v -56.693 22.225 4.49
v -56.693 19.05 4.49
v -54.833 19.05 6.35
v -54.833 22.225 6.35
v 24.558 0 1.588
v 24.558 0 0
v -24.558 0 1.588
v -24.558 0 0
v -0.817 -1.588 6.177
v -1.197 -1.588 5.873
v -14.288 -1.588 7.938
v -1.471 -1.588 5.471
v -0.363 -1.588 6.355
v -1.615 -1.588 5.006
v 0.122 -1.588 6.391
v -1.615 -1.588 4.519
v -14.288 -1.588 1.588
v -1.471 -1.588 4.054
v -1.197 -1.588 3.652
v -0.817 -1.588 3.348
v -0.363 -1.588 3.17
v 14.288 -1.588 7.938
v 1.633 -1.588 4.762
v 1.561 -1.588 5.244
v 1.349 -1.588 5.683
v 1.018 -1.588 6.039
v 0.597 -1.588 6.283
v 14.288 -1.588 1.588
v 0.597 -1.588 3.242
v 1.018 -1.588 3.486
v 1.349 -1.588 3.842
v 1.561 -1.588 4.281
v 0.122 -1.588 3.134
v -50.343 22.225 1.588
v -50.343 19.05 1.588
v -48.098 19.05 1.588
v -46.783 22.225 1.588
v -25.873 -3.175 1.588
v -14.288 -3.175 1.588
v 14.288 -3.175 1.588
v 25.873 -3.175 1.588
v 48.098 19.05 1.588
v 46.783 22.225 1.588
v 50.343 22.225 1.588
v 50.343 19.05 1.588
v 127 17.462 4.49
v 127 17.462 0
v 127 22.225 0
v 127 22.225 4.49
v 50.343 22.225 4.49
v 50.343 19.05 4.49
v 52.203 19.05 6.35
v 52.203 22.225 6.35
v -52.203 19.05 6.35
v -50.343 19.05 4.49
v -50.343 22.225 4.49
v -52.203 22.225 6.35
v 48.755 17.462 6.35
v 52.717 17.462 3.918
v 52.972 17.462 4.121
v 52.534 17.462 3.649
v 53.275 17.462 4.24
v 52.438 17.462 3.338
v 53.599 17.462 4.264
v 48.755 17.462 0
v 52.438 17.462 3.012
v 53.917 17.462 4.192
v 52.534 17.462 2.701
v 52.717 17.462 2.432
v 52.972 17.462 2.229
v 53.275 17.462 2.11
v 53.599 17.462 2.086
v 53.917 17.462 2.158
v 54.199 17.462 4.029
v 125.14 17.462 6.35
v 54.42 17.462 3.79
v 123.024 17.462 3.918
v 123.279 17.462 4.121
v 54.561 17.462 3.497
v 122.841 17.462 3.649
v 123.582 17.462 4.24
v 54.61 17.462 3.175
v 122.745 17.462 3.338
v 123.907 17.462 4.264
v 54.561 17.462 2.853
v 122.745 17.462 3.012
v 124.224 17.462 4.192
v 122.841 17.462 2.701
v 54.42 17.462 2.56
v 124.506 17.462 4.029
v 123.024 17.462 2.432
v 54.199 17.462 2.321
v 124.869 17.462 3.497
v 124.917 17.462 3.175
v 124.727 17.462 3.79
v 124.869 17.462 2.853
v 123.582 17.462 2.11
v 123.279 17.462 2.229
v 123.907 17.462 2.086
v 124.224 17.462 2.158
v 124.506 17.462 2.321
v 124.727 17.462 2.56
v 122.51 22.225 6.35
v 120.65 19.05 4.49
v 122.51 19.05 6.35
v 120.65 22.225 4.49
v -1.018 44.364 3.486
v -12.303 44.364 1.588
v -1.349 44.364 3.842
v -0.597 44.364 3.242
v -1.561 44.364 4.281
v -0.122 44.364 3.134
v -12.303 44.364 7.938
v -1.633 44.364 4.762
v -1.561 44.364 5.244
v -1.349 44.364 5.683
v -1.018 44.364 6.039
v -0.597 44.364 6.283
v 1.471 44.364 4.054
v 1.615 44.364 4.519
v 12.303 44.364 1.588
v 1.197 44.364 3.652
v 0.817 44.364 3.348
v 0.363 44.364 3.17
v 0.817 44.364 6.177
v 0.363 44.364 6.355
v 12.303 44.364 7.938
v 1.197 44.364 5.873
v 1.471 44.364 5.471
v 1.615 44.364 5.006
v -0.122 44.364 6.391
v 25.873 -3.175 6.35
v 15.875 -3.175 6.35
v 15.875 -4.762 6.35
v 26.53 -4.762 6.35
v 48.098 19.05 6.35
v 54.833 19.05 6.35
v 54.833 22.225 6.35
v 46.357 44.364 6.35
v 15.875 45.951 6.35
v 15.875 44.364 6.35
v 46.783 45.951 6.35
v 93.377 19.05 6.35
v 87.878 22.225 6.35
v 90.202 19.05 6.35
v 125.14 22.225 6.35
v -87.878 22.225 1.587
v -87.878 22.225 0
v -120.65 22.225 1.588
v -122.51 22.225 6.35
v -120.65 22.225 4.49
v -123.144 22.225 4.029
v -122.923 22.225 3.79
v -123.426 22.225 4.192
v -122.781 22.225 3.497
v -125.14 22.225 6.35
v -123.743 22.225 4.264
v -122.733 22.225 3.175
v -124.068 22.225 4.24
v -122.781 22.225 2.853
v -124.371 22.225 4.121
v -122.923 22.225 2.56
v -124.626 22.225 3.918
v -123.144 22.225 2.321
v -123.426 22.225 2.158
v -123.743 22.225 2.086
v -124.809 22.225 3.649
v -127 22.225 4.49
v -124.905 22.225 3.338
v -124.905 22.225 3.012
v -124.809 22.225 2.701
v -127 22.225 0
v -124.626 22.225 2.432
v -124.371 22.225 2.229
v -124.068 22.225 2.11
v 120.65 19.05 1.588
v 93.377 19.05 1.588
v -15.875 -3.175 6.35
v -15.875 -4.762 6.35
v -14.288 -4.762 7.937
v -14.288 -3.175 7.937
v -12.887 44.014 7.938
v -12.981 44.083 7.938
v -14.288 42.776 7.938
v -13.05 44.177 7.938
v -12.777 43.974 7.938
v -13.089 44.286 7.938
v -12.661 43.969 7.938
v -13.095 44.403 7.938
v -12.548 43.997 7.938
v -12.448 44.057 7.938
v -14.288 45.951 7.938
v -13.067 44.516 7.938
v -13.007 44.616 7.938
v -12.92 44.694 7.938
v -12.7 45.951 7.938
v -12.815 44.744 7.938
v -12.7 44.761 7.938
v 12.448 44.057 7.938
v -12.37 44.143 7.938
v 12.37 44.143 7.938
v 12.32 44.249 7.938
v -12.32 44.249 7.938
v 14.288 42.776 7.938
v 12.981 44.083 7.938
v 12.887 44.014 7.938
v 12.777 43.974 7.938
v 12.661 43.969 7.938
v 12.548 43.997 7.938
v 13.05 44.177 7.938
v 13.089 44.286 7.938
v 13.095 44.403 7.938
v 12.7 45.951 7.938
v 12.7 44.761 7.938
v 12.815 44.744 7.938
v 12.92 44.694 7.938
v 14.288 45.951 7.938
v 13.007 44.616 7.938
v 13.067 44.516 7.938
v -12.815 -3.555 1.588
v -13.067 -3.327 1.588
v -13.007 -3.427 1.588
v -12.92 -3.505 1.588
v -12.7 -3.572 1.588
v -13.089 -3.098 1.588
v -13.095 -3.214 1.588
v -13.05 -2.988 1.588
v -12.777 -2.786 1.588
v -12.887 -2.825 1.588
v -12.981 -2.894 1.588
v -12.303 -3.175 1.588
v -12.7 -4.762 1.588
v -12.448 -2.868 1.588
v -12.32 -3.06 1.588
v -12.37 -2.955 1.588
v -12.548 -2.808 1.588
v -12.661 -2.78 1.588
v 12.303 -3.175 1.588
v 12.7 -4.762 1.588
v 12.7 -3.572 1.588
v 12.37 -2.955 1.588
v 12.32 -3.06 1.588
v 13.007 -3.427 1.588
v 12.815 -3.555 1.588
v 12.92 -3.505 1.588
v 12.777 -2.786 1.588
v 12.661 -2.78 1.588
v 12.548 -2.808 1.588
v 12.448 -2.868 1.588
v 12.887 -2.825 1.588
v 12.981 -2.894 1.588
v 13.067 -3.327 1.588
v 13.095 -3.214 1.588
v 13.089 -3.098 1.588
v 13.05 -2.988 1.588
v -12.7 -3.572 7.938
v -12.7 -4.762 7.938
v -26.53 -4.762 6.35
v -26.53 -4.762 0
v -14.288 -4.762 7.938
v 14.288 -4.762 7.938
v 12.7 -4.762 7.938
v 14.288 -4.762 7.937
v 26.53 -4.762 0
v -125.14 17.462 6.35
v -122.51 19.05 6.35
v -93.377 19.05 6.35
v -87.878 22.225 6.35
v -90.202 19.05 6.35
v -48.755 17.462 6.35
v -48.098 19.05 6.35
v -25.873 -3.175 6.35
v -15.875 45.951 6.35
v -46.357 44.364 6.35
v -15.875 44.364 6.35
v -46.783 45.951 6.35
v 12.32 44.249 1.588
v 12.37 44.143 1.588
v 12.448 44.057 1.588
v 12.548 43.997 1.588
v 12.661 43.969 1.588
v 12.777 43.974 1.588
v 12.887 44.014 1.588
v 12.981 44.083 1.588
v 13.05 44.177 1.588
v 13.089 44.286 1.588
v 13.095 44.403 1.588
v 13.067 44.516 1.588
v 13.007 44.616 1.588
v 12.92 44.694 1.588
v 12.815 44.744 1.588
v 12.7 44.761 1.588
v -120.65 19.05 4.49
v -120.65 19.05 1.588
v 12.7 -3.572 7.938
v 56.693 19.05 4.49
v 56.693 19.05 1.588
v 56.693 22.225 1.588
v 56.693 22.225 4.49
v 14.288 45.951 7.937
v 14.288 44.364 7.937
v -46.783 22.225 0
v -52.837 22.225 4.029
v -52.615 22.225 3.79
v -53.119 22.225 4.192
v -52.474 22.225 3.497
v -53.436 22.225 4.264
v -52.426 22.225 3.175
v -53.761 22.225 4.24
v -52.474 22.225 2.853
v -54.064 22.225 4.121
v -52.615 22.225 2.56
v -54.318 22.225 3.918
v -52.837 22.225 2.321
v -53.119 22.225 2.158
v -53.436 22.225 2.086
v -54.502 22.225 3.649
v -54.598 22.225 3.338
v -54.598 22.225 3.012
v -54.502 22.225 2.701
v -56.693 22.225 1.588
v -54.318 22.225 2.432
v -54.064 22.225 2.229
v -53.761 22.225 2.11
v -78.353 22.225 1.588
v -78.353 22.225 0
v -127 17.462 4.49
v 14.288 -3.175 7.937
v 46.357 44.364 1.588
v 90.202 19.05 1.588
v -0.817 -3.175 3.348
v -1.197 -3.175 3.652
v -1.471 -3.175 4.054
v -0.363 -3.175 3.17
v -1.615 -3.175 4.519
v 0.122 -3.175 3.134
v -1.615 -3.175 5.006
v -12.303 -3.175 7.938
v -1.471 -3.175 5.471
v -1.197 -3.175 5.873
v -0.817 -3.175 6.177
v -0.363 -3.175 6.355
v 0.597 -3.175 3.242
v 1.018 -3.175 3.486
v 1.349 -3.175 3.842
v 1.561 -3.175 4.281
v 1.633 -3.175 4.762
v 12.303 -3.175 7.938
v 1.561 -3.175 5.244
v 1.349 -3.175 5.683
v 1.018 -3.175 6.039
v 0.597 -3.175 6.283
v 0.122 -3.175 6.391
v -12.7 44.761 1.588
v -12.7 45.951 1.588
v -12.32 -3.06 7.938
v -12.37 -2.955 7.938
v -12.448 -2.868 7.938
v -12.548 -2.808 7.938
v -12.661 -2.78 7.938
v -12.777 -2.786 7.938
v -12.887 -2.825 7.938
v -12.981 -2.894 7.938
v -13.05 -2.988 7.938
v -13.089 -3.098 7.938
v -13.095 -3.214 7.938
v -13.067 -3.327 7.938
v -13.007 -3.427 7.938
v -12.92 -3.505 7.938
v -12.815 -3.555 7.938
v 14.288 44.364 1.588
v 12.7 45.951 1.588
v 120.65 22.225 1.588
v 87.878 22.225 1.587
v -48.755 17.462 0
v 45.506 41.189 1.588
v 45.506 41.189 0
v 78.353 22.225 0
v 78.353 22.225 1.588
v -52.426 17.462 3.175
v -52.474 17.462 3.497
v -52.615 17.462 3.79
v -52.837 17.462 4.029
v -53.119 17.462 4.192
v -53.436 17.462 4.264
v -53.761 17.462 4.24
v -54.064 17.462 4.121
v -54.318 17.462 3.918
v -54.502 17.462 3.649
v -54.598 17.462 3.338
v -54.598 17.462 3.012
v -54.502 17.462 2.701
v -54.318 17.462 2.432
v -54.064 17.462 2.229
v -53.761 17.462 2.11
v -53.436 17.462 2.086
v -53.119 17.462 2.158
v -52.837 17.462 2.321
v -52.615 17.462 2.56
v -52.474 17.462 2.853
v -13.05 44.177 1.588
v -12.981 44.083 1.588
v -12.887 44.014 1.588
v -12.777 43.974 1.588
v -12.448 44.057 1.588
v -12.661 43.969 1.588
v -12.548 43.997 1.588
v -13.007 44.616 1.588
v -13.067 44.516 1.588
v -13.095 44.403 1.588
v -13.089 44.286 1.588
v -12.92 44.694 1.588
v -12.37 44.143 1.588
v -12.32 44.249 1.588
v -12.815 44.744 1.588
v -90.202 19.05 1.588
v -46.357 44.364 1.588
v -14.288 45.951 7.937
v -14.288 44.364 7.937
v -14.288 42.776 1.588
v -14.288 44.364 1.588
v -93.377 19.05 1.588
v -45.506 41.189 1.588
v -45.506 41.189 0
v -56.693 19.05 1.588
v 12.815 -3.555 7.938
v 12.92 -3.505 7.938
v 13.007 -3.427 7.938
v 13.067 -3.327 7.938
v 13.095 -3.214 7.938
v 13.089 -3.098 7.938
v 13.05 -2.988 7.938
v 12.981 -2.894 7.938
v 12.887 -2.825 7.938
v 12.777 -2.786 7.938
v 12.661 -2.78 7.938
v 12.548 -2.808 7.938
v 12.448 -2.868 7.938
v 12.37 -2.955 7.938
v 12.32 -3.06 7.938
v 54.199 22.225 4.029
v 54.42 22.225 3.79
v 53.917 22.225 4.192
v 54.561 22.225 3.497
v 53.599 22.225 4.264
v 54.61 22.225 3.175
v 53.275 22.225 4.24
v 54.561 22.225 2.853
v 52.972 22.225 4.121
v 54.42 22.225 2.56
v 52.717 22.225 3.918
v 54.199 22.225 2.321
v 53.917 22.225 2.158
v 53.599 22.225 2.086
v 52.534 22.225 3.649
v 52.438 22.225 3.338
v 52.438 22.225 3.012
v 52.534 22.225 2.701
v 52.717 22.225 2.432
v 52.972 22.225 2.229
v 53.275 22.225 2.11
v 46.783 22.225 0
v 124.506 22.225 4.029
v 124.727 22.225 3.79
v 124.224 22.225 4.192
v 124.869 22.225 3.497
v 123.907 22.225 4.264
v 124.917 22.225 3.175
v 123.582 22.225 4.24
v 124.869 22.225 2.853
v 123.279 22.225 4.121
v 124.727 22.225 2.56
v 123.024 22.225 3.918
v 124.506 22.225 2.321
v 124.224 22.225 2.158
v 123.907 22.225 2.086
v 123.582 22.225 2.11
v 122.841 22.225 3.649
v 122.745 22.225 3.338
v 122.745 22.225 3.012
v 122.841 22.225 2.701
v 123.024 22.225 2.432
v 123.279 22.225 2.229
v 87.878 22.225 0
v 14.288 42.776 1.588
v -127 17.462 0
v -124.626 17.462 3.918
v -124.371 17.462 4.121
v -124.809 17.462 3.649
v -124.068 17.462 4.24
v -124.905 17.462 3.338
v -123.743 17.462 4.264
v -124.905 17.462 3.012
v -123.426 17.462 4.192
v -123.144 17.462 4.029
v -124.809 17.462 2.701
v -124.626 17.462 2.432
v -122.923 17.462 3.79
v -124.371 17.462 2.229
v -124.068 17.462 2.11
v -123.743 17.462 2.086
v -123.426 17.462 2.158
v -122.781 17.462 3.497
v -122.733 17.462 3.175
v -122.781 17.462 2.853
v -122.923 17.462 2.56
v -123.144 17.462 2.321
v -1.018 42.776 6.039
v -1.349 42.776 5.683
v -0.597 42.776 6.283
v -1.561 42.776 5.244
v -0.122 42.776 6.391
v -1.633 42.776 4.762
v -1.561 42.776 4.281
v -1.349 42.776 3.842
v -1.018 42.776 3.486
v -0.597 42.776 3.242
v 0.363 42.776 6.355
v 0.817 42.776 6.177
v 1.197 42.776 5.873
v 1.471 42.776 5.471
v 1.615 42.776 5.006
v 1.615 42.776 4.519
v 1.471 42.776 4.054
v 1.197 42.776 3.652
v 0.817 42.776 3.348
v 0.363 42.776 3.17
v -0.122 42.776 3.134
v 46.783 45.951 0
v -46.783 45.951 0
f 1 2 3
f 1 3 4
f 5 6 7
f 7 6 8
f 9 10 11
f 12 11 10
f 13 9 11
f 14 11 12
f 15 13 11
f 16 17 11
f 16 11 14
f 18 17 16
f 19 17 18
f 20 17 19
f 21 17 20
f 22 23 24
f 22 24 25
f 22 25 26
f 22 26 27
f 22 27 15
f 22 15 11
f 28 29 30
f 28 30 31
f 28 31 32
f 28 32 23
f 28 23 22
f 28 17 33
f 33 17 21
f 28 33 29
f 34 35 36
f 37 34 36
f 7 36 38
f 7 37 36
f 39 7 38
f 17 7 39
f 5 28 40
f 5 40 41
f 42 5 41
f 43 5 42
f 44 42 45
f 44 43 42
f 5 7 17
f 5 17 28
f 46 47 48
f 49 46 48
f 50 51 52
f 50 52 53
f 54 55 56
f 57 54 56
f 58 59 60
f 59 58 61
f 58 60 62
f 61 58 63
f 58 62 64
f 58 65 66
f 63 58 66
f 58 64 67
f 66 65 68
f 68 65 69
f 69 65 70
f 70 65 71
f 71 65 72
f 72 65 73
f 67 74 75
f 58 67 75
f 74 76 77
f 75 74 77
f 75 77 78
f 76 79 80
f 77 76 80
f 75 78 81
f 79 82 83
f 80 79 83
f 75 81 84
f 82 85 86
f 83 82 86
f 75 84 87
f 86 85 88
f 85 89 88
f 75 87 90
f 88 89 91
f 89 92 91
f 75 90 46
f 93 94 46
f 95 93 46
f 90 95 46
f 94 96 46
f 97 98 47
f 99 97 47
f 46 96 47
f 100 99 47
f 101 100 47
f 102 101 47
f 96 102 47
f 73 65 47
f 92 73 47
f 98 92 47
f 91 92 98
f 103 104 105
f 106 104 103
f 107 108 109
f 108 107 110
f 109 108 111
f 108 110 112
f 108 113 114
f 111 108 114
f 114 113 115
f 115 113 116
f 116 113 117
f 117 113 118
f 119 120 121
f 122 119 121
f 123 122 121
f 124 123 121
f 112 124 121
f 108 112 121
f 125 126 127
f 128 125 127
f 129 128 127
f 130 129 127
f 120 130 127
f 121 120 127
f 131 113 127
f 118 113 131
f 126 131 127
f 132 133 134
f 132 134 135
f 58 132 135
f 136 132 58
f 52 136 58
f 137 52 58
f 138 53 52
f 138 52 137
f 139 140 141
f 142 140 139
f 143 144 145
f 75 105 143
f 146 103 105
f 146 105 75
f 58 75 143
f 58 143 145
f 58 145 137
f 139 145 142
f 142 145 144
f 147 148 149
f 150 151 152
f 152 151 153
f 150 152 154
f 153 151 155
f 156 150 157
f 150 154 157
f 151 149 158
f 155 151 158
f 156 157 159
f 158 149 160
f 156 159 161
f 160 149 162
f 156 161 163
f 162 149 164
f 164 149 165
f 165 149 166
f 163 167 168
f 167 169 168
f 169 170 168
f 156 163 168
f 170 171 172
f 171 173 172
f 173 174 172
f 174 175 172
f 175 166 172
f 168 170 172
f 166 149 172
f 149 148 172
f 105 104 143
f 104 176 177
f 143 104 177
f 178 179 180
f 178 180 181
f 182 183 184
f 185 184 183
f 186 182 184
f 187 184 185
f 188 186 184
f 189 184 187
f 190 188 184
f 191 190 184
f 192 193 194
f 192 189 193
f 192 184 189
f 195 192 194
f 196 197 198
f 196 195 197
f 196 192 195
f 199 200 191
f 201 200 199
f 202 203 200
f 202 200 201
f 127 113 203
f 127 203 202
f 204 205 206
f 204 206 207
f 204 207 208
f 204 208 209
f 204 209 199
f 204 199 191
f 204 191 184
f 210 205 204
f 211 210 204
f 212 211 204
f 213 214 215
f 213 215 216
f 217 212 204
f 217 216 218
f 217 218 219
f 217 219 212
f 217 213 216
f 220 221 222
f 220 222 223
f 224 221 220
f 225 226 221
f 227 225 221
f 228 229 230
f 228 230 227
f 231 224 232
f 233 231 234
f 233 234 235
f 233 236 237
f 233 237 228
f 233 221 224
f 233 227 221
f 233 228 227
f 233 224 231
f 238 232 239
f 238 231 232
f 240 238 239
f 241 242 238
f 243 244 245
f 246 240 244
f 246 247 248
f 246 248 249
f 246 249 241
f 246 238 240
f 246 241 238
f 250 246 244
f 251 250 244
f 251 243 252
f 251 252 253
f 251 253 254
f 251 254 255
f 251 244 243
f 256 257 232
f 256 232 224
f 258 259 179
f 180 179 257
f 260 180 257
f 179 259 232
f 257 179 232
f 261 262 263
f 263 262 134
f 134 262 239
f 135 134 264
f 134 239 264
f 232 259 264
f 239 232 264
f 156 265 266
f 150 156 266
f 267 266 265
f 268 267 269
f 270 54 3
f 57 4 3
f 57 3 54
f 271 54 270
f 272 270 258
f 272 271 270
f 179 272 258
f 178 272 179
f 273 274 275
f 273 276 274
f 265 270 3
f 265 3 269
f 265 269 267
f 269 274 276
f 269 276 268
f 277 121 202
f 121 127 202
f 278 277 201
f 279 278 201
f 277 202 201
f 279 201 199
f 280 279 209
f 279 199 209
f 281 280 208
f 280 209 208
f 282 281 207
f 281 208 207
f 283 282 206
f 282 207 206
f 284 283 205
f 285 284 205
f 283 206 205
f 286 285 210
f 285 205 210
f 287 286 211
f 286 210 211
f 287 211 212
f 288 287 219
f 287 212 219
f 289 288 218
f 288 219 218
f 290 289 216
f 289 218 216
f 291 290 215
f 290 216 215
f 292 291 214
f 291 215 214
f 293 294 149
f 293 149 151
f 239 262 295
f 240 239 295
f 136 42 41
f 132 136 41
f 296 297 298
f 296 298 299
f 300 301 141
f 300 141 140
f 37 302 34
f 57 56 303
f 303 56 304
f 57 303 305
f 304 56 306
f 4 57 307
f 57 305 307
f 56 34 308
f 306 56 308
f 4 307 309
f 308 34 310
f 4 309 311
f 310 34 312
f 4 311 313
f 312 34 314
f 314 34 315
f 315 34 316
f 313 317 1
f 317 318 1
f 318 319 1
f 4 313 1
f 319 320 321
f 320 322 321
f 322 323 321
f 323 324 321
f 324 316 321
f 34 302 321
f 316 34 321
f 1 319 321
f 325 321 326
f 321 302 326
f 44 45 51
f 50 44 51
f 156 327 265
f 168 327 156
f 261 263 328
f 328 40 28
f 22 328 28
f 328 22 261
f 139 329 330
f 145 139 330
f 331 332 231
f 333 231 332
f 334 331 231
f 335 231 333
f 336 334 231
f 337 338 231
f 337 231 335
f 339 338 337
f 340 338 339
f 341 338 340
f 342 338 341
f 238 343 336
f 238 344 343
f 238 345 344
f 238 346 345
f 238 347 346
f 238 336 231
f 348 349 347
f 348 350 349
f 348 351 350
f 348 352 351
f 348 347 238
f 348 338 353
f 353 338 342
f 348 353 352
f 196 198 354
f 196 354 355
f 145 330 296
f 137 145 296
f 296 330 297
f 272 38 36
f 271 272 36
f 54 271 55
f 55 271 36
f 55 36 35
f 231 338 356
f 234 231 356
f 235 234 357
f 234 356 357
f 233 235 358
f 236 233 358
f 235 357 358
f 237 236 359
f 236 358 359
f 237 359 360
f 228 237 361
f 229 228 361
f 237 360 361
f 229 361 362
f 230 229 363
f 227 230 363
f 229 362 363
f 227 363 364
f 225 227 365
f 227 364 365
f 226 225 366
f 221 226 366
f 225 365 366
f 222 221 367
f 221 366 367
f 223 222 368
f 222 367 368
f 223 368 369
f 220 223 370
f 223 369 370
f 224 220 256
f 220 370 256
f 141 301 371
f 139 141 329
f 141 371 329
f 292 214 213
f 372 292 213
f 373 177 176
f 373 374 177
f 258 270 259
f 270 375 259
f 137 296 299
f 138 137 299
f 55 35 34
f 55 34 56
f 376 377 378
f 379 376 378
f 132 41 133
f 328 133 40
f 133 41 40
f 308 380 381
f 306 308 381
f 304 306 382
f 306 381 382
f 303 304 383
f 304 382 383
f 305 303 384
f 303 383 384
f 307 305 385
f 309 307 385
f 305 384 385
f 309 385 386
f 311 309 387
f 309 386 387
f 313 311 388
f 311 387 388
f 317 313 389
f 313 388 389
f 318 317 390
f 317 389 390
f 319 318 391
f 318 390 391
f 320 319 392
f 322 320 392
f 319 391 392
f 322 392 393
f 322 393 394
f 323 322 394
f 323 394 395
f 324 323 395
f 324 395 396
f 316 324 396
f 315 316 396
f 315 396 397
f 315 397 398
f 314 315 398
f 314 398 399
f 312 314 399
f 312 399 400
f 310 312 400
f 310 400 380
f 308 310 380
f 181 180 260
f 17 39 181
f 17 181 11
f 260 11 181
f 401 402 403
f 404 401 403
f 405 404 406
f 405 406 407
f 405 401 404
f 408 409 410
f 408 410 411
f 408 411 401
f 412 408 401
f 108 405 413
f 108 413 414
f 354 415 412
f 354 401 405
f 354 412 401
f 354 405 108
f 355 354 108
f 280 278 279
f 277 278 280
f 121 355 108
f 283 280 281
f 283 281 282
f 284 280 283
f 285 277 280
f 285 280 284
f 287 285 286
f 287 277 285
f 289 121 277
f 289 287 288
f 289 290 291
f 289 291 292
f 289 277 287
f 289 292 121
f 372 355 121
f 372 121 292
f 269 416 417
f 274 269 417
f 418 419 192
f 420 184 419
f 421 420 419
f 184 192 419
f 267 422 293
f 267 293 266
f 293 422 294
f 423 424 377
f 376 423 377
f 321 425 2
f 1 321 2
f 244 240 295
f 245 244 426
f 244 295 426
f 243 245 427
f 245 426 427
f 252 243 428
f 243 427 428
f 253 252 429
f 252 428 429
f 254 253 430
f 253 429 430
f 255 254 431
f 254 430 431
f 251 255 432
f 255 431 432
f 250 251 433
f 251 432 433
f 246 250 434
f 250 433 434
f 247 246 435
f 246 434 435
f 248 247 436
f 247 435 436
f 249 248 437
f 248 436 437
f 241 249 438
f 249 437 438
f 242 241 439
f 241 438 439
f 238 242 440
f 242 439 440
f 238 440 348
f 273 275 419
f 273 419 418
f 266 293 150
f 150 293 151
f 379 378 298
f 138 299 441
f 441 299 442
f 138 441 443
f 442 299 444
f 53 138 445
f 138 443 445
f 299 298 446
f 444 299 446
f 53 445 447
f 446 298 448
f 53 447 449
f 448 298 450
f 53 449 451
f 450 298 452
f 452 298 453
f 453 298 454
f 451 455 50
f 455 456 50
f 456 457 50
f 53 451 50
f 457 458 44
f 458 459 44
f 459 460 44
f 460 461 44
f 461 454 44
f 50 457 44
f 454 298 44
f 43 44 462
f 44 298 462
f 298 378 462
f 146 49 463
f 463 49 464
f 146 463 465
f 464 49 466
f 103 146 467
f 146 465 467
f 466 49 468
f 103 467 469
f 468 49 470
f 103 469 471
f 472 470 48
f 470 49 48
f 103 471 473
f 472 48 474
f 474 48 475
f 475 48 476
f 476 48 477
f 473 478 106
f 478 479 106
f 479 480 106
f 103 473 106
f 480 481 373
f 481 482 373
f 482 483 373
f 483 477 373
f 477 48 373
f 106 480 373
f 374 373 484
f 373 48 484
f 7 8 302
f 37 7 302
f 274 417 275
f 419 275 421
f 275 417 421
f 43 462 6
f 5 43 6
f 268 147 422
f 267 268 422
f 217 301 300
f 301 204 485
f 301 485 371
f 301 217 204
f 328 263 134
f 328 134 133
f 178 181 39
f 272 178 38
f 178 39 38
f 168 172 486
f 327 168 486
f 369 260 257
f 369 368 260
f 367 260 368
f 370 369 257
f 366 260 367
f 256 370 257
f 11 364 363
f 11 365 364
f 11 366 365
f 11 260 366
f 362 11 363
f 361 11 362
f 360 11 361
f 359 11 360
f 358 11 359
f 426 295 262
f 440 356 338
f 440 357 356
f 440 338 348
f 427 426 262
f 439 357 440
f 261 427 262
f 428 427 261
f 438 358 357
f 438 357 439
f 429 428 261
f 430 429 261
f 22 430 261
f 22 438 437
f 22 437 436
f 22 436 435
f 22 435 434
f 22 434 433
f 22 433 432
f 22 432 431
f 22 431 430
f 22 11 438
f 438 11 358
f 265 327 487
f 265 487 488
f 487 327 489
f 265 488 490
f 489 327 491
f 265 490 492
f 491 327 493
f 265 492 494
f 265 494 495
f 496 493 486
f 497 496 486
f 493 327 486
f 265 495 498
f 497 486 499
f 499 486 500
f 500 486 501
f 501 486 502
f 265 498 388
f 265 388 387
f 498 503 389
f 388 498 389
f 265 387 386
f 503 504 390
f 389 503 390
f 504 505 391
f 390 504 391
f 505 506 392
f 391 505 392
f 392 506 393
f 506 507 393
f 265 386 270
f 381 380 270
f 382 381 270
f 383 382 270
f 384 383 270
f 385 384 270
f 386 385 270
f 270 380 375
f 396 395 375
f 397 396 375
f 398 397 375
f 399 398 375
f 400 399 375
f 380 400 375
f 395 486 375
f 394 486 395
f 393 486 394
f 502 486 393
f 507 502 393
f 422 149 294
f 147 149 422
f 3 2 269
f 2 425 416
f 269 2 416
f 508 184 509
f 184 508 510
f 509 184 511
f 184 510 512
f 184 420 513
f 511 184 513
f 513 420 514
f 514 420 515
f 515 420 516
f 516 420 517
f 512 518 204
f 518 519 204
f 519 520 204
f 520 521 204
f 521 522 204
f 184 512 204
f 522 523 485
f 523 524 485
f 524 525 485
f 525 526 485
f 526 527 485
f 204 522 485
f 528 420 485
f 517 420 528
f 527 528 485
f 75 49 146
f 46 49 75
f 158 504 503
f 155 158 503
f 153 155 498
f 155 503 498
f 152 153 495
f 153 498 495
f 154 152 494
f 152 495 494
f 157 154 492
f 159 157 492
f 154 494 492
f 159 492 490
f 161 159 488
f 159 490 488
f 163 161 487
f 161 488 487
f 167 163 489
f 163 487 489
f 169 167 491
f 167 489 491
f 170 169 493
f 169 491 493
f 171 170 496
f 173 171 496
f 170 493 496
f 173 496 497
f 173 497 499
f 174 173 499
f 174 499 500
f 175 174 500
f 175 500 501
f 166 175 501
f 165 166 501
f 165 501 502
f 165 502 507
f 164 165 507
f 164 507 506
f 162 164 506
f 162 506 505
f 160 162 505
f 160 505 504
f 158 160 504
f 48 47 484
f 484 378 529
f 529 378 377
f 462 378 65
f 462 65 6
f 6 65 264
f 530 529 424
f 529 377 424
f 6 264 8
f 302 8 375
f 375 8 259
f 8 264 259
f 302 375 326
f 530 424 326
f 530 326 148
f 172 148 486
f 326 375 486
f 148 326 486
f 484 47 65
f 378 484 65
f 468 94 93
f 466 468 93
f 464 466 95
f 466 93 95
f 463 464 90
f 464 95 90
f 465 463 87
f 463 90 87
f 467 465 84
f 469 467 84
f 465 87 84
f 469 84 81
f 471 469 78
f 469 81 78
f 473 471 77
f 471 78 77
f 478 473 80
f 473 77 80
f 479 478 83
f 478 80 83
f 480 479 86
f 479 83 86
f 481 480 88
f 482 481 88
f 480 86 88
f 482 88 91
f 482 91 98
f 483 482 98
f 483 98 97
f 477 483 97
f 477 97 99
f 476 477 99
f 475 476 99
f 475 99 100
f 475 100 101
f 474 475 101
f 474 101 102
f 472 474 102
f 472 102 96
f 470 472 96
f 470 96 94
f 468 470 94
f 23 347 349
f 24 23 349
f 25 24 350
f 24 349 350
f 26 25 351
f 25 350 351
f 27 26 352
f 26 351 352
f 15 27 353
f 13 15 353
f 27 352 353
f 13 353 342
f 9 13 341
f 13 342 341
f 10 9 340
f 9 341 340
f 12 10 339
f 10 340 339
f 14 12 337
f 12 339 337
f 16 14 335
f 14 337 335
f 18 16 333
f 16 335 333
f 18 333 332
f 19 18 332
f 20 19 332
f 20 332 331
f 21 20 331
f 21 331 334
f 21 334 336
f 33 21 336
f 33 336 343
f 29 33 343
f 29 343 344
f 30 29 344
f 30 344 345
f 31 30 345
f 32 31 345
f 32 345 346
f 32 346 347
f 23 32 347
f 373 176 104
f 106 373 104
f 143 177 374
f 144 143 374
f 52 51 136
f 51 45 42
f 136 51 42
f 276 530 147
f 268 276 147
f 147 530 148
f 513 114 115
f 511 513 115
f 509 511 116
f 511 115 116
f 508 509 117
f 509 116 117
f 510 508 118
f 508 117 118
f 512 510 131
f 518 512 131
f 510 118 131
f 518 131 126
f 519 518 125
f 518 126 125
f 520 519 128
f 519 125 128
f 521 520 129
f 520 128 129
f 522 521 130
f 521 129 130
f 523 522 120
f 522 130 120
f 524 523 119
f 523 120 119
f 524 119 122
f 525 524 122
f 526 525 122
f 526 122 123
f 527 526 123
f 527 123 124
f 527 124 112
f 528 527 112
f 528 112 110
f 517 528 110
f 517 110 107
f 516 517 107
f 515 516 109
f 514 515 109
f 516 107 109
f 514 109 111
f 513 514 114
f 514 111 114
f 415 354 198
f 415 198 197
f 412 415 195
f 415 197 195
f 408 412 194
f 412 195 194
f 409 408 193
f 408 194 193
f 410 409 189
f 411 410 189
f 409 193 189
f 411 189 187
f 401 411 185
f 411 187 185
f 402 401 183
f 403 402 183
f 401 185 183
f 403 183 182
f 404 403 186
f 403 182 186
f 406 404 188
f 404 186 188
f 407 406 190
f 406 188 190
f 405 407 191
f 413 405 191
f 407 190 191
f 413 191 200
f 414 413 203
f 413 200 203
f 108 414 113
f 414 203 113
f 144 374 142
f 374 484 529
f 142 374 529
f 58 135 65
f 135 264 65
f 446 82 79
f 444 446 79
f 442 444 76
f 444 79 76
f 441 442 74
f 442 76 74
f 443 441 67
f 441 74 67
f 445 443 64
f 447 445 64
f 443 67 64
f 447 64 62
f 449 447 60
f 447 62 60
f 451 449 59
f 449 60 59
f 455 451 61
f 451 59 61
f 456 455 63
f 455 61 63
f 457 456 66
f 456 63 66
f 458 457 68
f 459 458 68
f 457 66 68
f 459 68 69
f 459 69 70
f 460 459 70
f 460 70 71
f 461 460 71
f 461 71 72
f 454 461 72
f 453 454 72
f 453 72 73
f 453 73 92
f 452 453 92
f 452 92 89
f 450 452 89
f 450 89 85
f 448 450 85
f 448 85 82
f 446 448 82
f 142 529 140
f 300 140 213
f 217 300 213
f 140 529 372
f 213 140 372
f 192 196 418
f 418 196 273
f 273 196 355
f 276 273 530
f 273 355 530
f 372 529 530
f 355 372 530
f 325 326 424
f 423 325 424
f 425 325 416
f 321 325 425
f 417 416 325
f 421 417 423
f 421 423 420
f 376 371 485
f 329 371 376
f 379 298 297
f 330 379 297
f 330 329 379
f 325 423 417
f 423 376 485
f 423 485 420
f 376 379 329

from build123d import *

# Parameters (mm, degrees)
F1_DEPTH  = 1.5875
F3_DEPTH  = 4.7625
F4_W      = 6.35
F4_H      = 6.35
F5_DEPTH  = 3.175
F6_SIZE   = 1.8598642
F7_W      = 28.575
F7_H      = 3.175
F8_DEPTH  = 1.5875
F9_W      = 25.4
F9_H      = 1.5875
F10_DEPTH = 6.35
F11_R     = 1.0922
F11_R_2   = 1.63322
F12_DEPTH = 25.4
F13_SIZE  = 1.58749
F14_R     = 0.396875
F15_DEPTH = 6.35
F16_R     = 1.63322
F17_DEPTH = 1.5875


# Not quite as in the source:
# - a fillet or chamfer is up to 0.001 mm smaller than in the source, because OpenCascade refuses the exact size


with BuildPart() as f1:
    # F0 (on Top) → F1 (new body)
    with BuildSketch(Plane.XY):
        Polygon((-87.87765, 22.225), (-127, 22.225), (-127, 17.4625), (-48.7553, 17.4625), (-26.5303, -4.7625), (26.5303, -4.7625), (48.7553, 17.4625), (127, 17.4625), (127, 22.225), (87.87765, 22.225), (46.7826079092, 45.9512336135), (-46.7826079092, 45.9512336135), align=None)
        Polygon((-24.5576079092, 0), (-46.7826079092, 22.225), (-78.35265, 22.225), (-45.5064998802, 41.1887336135), (45.5064998802, 41.1887336135), (78.35265, 22.225), (46.7826079092, 22.225), (24.5576079092, 0), align=None, mode=Mode.SUBTRACT)
    extrude(amount=F1_DEPTH)

    # F2 (on face) → F3 (join)
    with BuildSketch(Plane.XY.offset(1.5875)):
        Polygon((-127, 19.05), (-127, 17.4625), (-48.7553, 17.4625), (-26.5303, -4.7625), (26.5303, -4.7625), (48.7553, 17.4625), (127, 17.4625), (127, 19.05), (93.376911314, 19.05), (87.87765, 22.225), (46.7826079092, 45.9512336135), (-46.7826079092, 45.9512336135), (-87.87765, 22.225), (-93.376911314, 19.05), align=None)
        Polygon((90.201911314, 19.05), (48.0977359697, 19.05), (25.8727359697, -3.175), (14.2875, -3.175), (14.2875, -1.5875), (-14.2875, -1.5875), (-14.2875, -3.175), (-25.8727359697, -3.175), (-48.0977359697, 19.05), (-90.201911314, 19.05), (-46.3572385662, 44.3637336135), (-14.2875, 44.3637336135), (-14.2875, 42.7762336135), (14.2875, 42.7762336135), (14.2875, 44.3637336135), (46.3572385662, 44.3637336135), align=None, mode=Mode.SUBTRACT)
    extrude(amount=F3_DEPTH)

    # F4 (on face) → F5 (join, through all)
    with BuildSketch(Plane(origin=(0, 19.05, 0), x_dir=(-1, 0, 0), z_dir=(0, 1, 0))):
        with Locations((-53.5178, 3.175)):
            Rectangle(F4_W, F4_H)
        with Locations((-123.825, 3.175)):
            Rectangle(F4_W, F4_H)
        with Locations((123.825, 3.175)):
            Rectangle(F4_W, F4_H)
        with Locations((53.5178, 3.175)):
            Rectangle(F4_W, F4_H)
    extrude(amount=F5_DEPTH)

    # F6
    f6_edges = [f1.edges().sort_by_distance(p)[0] for p in [
        (-127, 19.84375, 6.35),
        (-120.65, 20.6375, 6.35),
        (-56.6928, 20.6375, 6.35),
        (-50.3428, 20.6375, 6.35),
        (50.3428, 20.6375, 6.35),
        (56.6928, 20.6375, 6.35),
        (120.65, 20.6375, 6.35),
        (127, 19.84375, 6.35),
    ]]
    chamfer(f6_edges, length=F6_SIZE)

    # F7 (on face) → F8 (join)
    with BuildSketch(Plane.XY.offset(6.35)):
        with Locations((0, -3.175)):
            Rectangle(F7_W, F7_H)
        with Locations((0, 44.3637336135)):
            Rectangle(F7_W, F7_H)
    extrude(amount=F8_DEPTH)

    # F9 (on face) → F10 (cut, through all)
    with BuildSketch(Plane.XY.offset(7.9375)):
        with Locations((0, -3.96875)):
            Rectangle(F9_W, F9_H)
        with Locations((0, 45.1574836135)):
            Rectangle(F9_W, F9_H)
    extrude(amount=-F10_DEPTH, mode=Mode.SUBTRACT)

    # F11 (on face) → F12 (cut, through all)
    with BuildSketch(Plane.XZ.offset(3.175)):
        with Locations((53.5178, 3.175)):
            Circle(F11_R)
        with Locations((123.825, 3.175)):
            Circle(F11_R)
        with Locations((-123.825, 3.175)):
            Circle(F11_R)
        with Locations((-53.5178, 3.175)):
            Circle(F11_R)
        with Locations((0, 4.7625)):
            Circle(F11_R_2)
    extrude(amount=-F12_DEPTH, mode=Mode.SUBTRACT)

    # F13 (size 1.5875 in the source; OpenCascade refuses exactly that, so slightly less here)
    f13_edges = [f1.edges().sort_by_distance(p)[0] for p in [
        (-14.2875, -3.96875, 6.35),
        (14.2875, -3.96875, 6.35),
        (-14.2875, 45.157484, 6.35),
        (14.2875, 45.157484, 6.35),
    ]]
    chamfer(f13_edges, length=F13_SIZE)

    # F14 (on face) → F15 (cut, through all)
    with BuildSketch(Plane.XY.offset(7.9375)):
        with Locations((-12.7, -3.175)):
            Circle(F14_R)
        with Locations((12.7, -3.175)):
            Circle(F14_R)
        with Locations((-12.7, 44.3637336135)):
            Circle(F14_R)
        with Locations((12.7, 44.3637336135)):
            Circle(F14_R)
    extrude(amount=-F15_DEPTH, mode=Mode.SUBTRACT)

    # F16 (on face) → F17 (cut, through all)
    with BuildSketch(Plane(origin=(0, 44.3637336135, 0), x_dir=(-1, 0, 0), z_dir=(0, 1, 0))):
        with Locations((0, 4.7625)):
            Circle(F16_R)
    extrude(amount=-F17_DEPTH, mode=Mode.SUBTRACT)


solid = f1.part
